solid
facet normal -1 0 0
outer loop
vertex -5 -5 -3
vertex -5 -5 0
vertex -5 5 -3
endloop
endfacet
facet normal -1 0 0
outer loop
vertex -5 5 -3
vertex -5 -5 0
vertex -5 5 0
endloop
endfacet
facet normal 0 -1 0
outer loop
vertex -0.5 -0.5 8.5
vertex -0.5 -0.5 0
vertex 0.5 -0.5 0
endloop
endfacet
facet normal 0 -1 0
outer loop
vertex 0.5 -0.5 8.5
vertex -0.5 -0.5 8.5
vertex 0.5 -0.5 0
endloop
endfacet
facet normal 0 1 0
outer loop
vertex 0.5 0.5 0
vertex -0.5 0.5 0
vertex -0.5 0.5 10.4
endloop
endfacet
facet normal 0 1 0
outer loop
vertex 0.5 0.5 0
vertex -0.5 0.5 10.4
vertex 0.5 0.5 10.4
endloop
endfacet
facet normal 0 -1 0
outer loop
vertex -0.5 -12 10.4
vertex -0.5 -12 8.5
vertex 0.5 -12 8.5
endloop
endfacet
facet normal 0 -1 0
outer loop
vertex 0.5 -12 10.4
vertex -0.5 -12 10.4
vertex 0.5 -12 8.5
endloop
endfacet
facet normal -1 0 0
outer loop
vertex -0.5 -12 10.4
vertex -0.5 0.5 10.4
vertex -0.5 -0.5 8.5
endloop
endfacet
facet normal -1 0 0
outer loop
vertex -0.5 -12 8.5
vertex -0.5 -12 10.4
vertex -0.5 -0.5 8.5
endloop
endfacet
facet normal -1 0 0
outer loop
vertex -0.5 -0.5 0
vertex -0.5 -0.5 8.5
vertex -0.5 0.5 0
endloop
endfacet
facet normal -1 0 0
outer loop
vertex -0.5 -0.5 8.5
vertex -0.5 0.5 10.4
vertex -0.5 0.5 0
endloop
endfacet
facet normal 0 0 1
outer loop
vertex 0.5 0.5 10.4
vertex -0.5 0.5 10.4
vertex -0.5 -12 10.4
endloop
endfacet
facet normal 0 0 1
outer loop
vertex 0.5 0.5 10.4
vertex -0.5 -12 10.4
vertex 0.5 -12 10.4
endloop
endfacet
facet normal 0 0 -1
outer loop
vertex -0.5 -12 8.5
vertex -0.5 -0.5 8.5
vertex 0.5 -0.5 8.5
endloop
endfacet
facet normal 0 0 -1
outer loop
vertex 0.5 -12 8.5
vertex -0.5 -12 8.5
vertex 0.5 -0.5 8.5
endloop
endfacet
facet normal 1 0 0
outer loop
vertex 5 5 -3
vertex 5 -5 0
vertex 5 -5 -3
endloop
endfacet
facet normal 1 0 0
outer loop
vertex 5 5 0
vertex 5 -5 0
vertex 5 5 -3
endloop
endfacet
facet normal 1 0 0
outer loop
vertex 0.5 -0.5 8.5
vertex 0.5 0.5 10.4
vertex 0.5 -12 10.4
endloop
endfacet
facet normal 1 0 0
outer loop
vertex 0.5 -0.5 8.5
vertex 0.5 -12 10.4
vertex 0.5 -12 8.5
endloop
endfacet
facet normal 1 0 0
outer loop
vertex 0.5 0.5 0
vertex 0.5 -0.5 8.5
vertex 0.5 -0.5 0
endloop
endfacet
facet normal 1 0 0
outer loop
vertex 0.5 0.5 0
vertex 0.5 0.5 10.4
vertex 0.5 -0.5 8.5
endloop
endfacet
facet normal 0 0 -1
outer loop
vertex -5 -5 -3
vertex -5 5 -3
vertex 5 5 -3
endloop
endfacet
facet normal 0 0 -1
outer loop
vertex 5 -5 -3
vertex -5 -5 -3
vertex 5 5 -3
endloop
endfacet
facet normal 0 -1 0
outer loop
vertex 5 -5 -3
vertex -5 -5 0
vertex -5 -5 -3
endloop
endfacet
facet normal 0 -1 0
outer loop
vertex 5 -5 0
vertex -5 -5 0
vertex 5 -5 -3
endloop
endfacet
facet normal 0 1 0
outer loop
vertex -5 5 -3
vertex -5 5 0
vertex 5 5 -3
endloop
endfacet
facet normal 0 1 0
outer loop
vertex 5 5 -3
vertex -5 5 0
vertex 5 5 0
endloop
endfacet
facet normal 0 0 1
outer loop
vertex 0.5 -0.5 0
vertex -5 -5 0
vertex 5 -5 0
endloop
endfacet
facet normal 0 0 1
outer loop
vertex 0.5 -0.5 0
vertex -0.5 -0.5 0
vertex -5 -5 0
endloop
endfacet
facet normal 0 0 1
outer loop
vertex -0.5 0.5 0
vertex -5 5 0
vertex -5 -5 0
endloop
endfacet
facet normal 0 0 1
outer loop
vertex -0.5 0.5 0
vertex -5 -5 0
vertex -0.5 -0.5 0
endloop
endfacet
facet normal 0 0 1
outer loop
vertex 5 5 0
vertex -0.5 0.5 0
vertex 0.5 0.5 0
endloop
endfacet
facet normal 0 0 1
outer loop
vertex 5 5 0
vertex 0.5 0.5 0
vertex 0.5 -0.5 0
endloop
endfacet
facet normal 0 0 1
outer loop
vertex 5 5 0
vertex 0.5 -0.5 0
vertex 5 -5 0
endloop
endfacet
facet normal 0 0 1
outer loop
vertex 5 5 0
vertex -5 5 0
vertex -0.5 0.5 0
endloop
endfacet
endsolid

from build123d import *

# Parameters (mm, degrees)
SKETCH1_W           = 10
SKETCH1_H           = 10
BOSS_EXTRUDE3_DEPTH = 3
SKETCH5_W           = 1
SKETCH5_H           = 1
BOSS_EXTRUDE4_DEPTH = 10.4
SKETCH6_W           = 1
SKETCH6_H           = 1.9
BOSS_EXTRUDE5_DEPTH = 12.5


with BuildPart() as part:
    # Sketch1 → Boss-Extrude3 (new body)
    with BuildSketch(Plane.XY):
        Rectangle(SKETCH1_W, SKETCH1_H)
    extrude(amount=-BOSS_EXTRUDE3_DEPTH)

    # Sketch5 → Boss-Extrude4 (add)
    with BuildSketch(Plane.XY):
        Rectangle(SKETCH5_W, SKETCH5_H)
    extrude(amount=BOSS_EXTRUDE4_DEPTH)

    # Sketch6 → Boss-Extrude5 (add)
    with BuildSketch(Plane(origin=(0, 0.5, 0), x_dir=(1, 0, 0), z_dir=(0, 1, 0))):
        with Locations((0, -9.45)):
            Rectangle(SKETCH6_W, SKETCH6_H)
    extrude(amount=-BOSS_EXTRUDE5_DEPTH)


solid = part.part
